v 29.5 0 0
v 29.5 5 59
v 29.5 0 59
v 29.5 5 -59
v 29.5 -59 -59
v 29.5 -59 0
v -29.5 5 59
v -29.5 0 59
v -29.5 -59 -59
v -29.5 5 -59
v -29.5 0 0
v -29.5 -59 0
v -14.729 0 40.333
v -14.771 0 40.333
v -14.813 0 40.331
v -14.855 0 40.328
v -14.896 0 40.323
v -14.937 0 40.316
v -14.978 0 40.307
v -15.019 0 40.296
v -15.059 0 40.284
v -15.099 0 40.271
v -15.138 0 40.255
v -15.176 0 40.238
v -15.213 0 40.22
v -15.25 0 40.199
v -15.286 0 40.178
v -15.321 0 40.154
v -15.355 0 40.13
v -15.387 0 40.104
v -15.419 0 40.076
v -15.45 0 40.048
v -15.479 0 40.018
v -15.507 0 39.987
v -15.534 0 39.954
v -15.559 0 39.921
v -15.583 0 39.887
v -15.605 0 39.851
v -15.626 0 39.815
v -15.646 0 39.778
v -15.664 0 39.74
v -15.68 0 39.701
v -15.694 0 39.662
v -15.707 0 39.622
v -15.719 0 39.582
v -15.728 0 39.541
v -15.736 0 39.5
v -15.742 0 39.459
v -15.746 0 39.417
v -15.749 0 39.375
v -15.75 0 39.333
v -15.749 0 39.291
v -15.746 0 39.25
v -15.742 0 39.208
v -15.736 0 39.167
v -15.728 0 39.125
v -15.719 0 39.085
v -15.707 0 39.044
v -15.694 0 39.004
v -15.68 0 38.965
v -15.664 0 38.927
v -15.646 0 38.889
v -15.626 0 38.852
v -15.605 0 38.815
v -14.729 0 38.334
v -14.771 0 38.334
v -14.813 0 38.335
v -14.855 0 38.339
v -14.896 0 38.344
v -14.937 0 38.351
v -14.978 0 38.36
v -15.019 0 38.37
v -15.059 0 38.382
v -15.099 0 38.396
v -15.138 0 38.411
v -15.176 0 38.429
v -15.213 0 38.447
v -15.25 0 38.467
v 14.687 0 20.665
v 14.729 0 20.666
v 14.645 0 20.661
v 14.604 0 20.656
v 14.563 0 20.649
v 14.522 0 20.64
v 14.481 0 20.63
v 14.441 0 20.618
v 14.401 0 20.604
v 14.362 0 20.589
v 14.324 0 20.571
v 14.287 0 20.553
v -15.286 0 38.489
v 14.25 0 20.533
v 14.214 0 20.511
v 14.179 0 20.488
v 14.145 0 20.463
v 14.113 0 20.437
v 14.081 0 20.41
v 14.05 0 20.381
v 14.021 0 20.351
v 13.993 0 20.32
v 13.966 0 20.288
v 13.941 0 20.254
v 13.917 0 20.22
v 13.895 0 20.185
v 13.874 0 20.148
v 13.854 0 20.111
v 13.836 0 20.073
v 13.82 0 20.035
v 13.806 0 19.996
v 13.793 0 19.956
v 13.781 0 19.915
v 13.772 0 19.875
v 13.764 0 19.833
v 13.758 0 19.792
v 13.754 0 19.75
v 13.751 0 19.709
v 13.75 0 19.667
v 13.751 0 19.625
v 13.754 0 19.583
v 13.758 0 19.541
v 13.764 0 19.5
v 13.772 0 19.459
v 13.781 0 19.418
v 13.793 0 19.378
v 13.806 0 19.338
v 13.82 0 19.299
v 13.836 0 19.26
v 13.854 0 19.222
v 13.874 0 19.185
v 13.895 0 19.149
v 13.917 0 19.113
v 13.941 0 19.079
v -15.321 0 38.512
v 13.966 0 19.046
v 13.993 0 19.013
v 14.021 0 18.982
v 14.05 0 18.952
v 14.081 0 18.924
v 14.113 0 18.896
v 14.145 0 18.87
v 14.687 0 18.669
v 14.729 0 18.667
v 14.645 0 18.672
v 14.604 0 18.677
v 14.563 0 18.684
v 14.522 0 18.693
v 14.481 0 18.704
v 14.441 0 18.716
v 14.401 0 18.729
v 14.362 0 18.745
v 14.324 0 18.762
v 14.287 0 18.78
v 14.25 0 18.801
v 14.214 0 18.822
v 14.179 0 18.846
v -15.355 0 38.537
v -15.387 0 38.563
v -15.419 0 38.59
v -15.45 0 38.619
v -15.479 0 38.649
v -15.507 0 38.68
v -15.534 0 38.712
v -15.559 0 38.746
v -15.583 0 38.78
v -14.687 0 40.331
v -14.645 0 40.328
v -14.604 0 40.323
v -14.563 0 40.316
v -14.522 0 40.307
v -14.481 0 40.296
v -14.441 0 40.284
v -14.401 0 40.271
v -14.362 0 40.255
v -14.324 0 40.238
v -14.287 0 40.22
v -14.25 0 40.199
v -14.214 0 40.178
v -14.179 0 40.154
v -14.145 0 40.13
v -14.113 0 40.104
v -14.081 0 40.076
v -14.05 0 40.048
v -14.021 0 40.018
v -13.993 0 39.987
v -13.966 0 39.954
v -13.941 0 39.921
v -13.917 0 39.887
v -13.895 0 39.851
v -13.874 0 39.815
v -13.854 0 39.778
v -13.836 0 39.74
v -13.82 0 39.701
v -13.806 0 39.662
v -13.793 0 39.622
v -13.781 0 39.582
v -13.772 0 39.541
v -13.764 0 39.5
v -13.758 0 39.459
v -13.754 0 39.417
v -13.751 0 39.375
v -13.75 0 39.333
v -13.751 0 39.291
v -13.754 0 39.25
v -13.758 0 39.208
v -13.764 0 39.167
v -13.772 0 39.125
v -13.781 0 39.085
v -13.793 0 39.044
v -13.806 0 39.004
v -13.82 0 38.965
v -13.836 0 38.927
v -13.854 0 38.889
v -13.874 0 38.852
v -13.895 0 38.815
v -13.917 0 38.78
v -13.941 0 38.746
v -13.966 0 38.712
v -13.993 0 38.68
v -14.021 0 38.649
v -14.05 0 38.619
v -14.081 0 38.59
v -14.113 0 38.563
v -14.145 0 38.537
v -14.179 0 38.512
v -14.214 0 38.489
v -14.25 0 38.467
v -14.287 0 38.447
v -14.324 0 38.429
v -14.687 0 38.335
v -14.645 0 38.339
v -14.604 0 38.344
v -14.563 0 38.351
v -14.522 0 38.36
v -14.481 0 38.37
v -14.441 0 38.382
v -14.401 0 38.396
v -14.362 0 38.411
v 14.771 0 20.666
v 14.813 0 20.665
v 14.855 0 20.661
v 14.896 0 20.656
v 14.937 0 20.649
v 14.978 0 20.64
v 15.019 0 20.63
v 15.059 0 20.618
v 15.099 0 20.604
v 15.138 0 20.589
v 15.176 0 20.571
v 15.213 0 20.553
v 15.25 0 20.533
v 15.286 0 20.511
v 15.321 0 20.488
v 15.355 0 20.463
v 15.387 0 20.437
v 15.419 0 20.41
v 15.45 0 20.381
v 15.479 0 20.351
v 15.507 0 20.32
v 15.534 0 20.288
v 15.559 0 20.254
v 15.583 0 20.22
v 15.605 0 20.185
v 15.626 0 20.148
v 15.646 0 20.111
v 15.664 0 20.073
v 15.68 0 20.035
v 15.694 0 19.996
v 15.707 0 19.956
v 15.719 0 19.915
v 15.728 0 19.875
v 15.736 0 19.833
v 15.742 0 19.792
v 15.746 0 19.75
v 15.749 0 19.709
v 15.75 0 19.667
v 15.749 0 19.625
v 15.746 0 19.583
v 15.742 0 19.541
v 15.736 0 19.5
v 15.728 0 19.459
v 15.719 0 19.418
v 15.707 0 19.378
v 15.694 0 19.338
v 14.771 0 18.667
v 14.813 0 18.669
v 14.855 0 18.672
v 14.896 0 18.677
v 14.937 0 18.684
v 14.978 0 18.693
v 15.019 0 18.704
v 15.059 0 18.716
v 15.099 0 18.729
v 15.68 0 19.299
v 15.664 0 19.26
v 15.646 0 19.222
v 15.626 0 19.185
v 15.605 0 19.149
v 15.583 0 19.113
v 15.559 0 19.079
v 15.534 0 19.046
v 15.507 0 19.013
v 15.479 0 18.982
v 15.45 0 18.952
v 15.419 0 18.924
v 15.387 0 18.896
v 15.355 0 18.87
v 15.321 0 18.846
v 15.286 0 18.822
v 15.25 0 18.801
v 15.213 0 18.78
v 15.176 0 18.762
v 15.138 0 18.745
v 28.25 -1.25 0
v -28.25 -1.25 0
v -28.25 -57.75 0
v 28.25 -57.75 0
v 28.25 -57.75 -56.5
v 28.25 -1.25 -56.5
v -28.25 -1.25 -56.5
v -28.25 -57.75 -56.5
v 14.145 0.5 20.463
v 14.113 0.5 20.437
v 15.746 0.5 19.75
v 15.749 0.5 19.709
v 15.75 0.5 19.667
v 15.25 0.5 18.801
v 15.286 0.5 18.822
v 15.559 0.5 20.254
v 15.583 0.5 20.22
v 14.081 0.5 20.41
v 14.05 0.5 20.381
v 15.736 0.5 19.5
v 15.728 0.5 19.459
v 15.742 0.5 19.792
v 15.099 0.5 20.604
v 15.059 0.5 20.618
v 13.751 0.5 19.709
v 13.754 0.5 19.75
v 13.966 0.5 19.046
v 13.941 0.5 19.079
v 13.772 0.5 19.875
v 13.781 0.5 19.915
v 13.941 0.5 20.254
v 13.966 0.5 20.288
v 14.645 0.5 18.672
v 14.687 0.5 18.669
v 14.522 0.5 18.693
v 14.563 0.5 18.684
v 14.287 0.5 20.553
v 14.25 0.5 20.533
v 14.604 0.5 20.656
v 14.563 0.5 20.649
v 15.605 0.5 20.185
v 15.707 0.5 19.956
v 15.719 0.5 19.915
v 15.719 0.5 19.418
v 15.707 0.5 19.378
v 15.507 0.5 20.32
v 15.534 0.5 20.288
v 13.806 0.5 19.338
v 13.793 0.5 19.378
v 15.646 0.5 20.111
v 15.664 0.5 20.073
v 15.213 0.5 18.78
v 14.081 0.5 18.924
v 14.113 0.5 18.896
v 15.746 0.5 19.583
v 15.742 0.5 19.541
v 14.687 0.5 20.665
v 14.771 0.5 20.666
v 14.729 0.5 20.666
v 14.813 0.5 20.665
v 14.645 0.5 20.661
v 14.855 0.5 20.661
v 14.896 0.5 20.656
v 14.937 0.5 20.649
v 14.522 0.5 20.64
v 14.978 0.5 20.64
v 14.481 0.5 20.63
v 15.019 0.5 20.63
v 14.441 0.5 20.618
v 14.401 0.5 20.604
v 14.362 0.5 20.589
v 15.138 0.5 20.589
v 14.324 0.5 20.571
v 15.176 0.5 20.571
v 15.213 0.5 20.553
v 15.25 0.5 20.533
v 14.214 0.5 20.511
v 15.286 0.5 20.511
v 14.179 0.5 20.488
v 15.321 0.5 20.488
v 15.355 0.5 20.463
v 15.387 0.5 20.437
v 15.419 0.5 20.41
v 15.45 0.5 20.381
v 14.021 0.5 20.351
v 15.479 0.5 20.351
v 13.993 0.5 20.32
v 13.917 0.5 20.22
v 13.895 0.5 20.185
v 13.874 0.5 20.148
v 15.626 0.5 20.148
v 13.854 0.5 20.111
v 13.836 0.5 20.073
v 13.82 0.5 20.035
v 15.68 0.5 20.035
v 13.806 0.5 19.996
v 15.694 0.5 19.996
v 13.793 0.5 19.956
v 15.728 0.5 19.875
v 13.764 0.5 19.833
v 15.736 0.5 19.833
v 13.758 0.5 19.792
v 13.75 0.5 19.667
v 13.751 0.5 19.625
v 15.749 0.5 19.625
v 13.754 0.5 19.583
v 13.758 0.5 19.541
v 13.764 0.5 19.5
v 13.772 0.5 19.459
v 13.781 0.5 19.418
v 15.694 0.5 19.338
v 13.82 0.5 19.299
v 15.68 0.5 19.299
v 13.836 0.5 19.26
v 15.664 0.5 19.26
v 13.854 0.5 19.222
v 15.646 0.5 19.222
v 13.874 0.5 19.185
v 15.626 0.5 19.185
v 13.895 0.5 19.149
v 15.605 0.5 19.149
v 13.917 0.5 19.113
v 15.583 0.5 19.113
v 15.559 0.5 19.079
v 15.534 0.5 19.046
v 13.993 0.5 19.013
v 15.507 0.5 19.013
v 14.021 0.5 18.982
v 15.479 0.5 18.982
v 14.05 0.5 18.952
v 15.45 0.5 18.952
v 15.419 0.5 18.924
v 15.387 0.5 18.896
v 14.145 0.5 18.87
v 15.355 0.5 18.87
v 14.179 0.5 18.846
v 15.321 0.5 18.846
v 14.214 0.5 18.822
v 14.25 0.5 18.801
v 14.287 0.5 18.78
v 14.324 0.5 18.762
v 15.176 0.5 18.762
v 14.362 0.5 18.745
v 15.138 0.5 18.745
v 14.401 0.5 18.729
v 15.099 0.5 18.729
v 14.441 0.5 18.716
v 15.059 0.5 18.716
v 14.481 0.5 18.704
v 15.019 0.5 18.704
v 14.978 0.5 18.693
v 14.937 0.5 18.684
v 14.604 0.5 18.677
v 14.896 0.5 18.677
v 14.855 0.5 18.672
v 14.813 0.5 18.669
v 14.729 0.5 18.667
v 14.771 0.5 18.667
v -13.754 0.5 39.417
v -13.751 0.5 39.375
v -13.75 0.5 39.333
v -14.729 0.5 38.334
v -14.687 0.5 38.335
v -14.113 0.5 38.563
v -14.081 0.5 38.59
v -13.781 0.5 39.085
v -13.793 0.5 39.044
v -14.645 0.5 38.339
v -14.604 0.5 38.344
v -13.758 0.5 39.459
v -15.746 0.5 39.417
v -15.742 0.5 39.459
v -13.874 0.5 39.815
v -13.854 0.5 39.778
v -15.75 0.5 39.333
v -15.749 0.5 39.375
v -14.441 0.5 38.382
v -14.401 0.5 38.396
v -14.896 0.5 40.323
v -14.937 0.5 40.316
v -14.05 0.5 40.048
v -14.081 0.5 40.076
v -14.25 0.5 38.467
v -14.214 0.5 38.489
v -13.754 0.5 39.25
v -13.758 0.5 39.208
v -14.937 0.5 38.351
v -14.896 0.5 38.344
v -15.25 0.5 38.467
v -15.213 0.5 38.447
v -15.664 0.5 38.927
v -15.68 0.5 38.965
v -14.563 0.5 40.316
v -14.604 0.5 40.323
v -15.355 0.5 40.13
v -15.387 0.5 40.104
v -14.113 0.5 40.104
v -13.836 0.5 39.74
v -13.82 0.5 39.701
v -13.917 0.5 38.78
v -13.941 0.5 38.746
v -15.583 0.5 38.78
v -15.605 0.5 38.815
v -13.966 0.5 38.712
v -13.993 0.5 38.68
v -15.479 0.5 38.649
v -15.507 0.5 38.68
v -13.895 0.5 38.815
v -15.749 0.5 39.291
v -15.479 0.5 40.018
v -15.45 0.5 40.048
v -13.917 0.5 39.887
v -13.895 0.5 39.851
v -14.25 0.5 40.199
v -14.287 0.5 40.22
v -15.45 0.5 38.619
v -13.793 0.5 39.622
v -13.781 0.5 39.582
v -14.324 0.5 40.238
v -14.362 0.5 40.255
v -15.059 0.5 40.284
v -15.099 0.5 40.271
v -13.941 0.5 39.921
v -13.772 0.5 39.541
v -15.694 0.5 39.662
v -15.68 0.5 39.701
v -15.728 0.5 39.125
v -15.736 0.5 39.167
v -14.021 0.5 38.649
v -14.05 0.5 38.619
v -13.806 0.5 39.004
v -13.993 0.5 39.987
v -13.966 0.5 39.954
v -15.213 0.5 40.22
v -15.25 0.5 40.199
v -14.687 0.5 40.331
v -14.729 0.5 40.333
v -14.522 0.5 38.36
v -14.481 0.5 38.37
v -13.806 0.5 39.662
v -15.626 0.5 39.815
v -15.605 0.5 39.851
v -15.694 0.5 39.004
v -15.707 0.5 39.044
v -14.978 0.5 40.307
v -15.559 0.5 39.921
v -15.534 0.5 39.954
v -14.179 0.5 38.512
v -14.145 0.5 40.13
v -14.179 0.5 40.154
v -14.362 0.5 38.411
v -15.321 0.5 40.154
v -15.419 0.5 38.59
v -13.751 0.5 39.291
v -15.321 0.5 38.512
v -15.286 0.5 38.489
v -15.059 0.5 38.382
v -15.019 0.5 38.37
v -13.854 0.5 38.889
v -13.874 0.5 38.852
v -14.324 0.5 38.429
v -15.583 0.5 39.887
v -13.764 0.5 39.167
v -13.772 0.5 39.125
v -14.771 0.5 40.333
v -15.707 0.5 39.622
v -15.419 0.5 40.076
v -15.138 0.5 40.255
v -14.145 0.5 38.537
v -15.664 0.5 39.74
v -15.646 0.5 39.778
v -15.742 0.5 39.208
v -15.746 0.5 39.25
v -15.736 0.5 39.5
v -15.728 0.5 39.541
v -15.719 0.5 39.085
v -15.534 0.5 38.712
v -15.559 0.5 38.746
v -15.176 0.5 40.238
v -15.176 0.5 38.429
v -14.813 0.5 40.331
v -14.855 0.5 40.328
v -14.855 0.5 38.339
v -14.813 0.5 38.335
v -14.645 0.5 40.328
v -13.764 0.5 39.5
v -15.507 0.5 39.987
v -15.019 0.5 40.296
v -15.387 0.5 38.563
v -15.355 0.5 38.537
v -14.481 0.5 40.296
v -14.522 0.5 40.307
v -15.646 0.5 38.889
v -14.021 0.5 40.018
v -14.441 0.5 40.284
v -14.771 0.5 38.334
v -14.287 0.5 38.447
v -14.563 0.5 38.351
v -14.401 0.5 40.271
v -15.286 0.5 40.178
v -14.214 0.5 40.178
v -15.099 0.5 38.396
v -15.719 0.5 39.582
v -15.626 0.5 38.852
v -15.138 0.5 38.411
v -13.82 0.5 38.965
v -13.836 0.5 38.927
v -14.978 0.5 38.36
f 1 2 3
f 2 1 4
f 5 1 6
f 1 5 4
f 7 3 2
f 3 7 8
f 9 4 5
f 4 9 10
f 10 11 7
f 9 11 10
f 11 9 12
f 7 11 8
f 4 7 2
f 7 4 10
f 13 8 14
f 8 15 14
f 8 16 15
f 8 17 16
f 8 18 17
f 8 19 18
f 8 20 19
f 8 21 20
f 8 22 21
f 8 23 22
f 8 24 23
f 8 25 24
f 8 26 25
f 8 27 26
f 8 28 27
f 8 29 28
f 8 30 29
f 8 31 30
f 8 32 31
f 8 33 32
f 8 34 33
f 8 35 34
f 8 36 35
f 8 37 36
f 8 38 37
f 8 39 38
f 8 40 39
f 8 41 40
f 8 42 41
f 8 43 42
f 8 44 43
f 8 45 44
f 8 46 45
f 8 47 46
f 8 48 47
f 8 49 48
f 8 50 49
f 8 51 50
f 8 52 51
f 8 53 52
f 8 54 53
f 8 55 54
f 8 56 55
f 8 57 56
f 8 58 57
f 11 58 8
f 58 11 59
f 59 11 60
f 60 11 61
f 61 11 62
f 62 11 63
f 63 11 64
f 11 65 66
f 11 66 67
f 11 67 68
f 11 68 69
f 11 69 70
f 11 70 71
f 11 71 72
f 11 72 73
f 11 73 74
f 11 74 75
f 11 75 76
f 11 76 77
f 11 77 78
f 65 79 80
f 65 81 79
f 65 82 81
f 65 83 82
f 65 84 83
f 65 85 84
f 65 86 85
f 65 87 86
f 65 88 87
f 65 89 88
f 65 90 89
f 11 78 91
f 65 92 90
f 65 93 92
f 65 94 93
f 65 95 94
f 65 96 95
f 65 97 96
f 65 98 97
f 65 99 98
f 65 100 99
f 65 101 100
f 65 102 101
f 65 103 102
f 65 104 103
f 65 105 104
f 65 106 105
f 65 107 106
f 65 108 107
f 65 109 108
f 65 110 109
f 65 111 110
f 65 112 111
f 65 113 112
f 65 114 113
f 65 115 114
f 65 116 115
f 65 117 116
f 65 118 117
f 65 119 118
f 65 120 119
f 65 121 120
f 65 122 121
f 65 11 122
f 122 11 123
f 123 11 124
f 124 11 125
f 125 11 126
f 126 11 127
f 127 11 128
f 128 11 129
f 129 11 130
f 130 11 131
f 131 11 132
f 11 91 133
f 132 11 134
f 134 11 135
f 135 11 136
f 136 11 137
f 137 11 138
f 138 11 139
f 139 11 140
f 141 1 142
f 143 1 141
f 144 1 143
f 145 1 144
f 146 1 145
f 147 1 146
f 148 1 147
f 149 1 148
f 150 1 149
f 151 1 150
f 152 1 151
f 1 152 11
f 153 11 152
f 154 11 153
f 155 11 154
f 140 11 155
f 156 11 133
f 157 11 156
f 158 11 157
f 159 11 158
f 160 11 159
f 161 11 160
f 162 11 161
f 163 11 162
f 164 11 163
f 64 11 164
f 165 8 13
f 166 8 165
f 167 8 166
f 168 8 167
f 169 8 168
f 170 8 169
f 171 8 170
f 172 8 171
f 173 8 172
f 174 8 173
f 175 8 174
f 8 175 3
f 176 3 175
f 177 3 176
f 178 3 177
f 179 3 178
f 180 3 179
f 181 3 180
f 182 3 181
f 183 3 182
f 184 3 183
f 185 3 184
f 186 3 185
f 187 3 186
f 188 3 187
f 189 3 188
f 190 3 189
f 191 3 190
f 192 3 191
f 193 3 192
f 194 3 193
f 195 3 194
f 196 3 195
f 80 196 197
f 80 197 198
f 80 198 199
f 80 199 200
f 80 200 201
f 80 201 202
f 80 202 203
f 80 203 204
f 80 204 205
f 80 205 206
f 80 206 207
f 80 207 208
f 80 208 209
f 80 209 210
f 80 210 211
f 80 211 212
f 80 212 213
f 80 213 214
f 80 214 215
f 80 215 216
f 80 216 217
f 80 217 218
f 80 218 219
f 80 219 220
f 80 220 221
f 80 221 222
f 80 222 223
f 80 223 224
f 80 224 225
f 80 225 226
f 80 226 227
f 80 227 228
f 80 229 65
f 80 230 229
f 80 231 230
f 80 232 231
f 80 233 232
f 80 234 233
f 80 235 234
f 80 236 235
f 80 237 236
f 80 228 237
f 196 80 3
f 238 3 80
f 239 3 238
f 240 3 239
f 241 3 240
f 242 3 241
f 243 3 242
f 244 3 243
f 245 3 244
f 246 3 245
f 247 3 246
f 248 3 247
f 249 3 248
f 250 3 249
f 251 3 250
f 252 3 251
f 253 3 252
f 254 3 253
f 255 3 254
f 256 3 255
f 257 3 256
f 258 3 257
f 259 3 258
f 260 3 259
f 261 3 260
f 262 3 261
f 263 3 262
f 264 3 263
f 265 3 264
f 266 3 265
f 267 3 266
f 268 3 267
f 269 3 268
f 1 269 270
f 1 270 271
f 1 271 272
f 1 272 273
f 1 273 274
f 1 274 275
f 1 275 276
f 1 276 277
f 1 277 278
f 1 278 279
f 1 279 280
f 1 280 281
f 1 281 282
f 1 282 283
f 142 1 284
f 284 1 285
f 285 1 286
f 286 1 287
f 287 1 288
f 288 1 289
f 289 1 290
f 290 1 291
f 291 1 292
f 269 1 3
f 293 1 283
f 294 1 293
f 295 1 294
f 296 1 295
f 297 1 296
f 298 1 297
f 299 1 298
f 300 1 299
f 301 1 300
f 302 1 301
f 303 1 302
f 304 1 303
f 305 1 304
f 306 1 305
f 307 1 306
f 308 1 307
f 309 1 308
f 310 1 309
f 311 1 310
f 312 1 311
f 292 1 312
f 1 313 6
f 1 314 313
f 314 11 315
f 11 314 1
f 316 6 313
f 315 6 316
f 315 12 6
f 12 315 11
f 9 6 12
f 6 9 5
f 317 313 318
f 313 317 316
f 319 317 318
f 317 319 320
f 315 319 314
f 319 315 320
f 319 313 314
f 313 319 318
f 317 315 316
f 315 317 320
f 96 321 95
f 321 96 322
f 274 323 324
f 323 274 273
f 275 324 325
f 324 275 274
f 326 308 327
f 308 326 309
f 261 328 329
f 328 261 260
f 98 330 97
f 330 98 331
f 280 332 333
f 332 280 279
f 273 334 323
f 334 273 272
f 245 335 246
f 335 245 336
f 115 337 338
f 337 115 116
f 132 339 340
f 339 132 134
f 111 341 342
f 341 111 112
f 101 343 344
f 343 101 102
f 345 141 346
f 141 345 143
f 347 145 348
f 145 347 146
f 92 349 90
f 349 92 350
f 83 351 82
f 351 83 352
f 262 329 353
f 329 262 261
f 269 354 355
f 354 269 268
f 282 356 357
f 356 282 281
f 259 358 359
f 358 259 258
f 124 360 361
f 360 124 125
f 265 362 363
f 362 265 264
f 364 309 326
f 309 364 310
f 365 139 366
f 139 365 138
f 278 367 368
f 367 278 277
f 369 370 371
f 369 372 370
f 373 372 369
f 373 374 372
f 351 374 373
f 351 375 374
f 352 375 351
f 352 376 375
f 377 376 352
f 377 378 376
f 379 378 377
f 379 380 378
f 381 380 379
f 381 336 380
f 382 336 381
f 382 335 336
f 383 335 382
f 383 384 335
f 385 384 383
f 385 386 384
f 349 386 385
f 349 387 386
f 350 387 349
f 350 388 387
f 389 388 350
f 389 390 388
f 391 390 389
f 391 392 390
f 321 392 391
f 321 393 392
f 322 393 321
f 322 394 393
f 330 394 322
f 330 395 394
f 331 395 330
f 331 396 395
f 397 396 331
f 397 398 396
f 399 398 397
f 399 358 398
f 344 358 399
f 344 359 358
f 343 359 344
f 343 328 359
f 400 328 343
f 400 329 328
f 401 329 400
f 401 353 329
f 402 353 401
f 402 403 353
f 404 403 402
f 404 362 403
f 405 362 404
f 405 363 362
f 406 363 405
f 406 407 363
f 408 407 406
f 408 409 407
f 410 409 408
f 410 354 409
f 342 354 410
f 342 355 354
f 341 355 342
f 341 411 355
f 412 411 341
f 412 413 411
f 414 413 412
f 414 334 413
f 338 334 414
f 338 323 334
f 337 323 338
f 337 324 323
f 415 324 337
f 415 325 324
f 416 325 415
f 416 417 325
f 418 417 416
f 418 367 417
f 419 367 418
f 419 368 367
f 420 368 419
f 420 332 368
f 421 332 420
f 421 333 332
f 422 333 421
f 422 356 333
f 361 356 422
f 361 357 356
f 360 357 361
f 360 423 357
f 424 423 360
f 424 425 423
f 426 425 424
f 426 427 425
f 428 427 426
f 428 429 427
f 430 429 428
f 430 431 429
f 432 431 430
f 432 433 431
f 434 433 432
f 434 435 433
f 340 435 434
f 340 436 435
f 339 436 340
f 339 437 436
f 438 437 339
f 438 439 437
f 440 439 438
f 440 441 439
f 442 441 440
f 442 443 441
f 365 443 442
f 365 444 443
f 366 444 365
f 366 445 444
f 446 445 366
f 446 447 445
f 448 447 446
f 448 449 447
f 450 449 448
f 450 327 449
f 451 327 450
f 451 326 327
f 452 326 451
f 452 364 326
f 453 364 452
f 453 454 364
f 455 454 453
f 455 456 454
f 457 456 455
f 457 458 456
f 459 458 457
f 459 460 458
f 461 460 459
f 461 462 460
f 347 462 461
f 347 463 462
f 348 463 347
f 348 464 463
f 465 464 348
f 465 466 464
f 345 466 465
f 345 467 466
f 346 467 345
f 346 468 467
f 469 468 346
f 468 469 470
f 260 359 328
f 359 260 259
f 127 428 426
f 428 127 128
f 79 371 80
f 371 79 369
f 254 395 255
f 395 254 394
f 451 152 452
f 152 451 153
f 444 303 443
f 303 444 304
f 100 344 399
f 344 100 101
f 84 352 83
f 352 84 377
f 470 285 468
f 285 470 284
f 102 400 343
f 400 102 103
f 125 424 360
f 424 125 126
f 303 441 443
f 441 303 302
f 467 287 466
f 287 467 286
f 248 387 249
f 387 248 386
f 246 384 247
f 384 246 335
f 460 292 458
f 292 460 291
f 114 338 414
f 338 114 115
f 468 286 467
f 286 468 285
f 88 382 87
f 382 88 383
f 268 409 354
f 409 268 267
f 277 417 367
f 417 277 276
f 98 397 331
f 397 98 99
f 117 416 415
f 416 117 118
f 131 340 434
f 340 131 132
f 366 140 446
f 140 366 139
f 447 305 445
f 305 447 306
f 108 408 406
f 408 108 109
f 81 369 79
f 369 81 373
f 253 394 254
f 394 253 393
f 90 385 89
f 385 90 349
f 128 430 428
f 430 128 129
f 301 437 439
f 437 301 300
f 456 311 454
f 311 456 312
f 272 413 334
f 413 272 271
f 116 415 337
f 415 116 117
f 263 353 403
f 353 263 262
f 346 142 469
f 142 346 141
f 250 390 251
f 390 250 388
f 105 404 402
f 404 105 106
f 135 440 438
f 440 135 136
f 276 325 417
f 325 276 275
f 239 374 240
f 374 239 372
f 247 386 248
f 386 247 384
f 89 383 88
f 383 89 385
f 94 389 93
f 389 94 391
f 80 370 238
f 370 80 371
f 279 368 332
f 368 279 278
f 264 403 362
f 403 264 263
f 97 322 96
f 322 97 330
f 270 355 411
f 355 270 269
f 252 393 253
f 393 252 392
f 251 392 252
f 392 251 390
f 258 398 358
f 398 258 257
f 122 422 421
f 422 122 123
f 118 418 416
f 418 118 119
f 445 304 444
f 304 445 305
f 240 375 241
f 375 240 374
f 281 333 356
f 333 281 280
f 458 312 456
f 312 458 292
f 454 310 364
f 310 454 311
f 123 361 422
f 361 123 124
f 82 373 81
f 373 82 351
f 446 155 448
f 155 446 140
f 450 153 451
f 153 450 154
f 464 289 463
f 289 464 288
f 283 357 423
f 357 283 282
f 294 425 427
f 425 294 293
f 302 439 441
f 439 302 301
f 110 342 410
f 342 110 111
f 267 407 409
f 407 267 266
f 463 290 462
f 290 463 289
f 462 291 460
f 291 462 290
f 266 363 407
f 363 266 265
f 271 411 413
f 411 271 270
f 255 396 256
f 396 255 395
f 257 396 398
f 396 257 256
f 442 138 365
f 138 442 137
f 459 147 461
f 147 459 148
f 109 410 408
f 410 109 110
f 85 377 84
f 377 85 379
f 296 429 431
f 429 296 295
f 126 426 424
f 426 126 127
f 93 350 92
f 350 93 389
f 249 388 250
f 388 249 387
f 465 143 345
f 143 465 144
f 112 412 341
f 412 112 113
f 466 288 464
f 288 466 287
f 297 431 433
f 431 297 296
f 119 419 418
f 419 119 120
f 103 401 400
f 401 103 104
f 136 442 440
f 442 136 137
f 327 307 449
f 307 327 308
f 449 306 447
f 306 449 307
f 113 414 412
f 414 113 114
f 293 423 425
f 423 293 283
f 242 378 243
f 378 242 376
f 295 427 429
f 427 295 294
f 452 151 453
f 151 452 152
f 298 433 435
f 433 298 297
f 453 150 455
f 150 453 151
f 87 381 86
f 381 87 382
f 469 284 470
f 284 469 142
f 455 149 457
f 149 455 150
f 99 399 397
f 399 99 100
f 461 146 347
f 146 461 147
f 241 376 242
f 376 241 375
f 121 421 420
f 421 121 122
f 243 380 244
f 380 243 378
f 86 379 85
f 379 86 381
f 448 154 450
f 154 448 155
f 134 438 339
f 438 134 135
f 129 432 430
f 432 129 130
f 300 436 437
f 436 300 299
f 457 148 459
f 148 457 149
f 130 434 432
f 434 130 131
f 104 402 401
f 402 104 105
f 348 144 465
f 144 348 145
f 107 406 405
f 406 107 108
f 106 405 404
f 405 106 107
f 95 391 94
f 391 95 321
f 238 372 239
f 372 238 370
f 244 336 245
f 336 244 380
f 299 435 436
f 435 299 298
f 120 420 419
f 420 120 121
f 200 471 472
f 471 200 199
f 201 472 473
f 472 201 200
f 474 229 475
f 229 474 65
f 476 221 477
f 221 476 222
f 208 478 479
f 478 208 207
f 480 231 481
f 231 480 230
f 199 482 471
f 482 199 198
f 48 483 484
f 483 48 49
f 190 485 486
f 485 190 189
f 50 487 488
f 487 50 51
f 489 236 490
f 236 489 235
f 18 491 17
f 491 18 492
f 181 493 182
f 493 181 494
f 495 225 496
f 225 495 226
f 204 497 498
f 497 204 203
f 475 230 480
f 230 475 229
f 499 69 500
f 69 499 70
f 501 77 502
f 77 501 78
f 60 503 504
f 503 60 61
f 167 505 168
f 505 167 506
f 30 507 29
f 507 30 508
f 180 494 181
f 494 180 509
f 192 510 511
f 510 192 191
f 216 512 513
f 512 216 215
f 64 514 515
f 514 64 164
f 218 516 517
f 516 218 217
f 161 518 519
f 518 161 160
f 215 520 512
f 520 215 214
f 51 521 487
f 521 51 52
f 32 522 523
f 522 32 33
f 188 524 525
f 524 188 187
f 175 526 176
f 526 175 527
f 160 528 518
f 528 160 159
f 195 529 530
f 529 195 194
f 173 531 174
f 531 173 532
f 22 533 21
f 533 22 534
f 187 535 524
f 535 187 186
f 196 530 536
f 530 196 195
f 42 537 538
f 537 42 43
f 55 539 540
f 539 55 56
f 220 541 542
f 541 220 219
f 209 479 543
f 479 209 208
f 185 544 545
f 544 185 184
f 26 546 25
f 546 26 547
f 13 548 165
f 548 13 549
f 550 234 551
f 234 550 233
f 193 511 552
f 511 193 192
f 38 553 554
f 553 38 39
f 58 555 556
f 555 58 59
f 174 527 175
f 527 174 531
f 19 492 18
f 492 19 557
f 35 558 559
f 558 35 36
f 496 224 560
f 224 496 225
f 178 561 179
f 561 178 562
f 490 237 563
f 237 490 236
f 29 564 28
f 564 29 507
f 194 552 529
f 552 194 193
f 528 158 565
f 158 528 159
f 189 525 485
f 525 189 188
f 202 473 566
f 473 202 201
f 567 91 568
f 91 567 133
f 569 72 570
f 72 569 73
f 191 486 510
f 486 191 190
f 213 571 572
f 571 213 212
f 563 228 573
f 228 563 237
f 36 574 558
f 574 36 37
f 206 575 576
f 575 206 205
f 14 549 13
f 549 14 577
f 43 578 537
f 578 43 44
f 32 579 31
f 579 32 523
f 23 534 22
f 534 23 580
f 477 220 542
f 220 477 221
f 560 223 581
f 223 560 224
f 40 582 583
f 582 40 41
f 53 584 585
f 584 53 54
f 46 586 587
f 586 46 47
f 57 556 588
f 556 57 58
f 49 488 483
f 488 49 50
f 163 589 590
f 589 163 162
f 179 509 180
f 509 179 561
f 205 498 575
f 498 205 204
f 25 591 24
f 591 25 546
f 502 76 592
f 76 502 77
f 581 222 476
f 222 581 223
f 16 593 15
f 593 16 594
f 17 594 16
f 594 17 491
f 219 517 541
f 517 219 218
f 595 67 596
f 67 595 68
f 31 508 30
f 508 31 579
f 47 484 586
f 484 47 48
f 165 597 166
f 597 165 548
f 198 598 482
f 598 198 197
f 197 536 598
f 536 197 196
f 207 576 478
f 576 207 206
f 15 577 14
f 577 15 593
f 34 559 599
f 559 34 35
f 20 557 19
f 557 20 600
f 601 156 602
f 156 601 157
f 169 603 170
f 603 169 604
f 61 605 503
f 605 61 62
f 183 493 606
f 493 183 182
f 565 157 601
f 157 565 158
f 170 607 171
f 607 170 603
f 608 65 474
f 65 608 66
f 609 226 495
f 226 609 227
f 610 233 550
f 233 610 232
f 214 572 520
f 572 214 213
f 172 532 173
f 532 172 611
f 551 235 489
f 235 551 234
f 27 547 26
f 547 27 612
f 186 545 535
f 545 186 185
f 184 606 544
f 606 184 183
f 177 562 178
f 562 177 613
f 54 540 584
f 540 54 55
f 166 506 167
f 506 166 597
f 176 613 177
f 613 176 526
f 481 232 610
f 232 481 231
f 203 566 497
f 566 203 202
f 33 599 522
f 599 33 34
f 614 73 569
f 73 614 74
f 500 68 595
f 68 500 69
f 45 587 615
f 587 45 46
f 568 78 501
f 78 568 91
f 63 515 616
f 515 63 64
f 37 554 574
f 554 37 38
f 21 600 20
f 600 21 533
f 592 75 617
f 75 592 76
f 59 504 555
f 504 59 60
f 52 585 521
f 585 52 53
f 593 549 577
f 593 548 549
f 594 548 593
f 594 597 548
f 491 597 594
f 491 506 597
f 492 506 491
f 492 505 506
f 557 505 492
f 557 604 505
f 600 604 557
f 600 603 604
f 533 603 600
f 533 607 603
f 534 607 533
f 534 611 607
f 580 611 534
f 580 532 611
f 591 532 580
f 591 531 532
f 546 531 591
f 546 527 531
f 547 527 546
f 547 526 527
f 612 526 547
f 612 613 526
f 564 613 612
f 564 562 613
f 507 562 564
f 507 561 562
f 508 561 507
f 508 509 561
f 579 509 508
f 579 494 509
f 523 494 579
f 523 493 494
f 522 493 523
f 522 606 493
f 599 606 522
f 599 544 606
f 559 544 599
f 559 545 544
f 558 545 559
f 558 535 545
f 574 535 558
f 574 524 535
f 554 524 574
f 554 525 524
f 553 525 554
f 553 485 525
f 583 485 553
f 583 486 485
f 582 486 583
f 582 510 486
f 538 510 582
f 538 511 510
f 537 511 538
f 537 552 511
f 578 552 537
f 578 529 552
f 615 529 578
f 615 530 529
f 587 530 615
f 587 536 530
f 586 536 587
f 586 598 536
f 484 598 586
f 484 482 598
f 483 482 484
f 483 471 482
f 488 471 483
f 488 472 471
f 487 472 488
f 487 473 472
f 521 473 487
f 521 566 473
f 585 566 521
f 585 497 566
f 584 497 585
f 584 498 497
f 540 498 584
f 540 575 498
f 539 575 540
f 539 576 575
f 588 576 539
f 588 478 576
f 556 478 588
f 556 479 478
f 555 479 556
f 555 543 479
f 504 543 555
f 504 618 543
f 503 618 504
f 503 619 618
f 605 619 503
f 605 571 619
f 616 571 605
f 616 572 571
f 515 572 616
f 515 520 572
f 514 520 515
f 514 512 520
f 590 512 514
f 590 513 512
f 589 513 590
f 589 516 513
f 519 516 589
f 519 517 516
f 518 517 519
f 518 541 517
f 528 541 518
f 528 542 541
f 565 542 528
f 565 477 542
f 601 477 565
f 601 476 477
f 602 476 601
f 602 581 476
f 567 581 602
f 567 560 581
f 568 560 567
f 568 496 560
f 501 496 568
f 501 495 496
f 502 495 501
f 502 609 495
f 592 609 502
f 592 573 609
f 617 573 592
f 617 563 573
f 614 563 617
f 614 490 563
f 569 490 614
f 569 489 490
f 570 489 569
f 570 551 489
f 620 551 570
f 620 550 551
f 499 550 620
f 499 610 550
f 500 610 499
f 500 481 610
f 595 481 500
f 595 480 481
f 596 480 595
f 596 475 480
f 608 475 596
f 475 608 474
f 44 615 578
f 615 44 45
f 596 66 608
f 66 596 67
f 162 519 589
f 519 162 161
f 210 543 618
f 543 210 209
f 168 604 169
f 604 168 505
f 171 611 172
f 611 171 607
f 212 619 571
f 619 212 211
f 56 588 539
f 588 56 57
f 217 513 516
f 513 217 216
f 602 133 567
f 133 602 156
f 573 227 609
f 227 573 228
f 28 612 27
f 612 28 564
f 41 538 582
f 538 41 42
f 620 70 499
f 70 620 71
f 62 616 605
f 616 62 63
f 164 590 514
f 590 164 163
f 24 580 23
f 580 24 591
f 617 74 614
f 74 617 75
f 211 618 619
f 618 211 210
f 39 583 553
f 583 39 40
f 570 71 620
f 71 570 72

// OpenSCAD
// Adjustable Tool Holder
// Units are mm

// Variables
w = 59;     //width of backplate
h = w*2;    //height of backplate
t = 5;      //thickness of backplate
d = 3;      //hole size

$fn = 150;

difference(){
    union(){
        //Backplate
        translate([0,t/2,0])
            cube([w,t,h],center=true);
            
        //Outter wall
        translate([0,-w/2,-w/2])
            cube([w,w,h/2],center=true);
    };    
        //Inner wall
        translate([0,-w/2,-w/2+t/2])
            cube([w-t/2,w-t/2,h/2],center=true);
    
        //mounting holes
        translate([w/4,0,h/6])rotate([90,0,0])
            cylinder([t*2,d/2,d/2],center=true);
        translate([-w/4,0,h/3])rotate([90,0,0])
            cylinder([t*2,d/2,d/2],center=true);
}
